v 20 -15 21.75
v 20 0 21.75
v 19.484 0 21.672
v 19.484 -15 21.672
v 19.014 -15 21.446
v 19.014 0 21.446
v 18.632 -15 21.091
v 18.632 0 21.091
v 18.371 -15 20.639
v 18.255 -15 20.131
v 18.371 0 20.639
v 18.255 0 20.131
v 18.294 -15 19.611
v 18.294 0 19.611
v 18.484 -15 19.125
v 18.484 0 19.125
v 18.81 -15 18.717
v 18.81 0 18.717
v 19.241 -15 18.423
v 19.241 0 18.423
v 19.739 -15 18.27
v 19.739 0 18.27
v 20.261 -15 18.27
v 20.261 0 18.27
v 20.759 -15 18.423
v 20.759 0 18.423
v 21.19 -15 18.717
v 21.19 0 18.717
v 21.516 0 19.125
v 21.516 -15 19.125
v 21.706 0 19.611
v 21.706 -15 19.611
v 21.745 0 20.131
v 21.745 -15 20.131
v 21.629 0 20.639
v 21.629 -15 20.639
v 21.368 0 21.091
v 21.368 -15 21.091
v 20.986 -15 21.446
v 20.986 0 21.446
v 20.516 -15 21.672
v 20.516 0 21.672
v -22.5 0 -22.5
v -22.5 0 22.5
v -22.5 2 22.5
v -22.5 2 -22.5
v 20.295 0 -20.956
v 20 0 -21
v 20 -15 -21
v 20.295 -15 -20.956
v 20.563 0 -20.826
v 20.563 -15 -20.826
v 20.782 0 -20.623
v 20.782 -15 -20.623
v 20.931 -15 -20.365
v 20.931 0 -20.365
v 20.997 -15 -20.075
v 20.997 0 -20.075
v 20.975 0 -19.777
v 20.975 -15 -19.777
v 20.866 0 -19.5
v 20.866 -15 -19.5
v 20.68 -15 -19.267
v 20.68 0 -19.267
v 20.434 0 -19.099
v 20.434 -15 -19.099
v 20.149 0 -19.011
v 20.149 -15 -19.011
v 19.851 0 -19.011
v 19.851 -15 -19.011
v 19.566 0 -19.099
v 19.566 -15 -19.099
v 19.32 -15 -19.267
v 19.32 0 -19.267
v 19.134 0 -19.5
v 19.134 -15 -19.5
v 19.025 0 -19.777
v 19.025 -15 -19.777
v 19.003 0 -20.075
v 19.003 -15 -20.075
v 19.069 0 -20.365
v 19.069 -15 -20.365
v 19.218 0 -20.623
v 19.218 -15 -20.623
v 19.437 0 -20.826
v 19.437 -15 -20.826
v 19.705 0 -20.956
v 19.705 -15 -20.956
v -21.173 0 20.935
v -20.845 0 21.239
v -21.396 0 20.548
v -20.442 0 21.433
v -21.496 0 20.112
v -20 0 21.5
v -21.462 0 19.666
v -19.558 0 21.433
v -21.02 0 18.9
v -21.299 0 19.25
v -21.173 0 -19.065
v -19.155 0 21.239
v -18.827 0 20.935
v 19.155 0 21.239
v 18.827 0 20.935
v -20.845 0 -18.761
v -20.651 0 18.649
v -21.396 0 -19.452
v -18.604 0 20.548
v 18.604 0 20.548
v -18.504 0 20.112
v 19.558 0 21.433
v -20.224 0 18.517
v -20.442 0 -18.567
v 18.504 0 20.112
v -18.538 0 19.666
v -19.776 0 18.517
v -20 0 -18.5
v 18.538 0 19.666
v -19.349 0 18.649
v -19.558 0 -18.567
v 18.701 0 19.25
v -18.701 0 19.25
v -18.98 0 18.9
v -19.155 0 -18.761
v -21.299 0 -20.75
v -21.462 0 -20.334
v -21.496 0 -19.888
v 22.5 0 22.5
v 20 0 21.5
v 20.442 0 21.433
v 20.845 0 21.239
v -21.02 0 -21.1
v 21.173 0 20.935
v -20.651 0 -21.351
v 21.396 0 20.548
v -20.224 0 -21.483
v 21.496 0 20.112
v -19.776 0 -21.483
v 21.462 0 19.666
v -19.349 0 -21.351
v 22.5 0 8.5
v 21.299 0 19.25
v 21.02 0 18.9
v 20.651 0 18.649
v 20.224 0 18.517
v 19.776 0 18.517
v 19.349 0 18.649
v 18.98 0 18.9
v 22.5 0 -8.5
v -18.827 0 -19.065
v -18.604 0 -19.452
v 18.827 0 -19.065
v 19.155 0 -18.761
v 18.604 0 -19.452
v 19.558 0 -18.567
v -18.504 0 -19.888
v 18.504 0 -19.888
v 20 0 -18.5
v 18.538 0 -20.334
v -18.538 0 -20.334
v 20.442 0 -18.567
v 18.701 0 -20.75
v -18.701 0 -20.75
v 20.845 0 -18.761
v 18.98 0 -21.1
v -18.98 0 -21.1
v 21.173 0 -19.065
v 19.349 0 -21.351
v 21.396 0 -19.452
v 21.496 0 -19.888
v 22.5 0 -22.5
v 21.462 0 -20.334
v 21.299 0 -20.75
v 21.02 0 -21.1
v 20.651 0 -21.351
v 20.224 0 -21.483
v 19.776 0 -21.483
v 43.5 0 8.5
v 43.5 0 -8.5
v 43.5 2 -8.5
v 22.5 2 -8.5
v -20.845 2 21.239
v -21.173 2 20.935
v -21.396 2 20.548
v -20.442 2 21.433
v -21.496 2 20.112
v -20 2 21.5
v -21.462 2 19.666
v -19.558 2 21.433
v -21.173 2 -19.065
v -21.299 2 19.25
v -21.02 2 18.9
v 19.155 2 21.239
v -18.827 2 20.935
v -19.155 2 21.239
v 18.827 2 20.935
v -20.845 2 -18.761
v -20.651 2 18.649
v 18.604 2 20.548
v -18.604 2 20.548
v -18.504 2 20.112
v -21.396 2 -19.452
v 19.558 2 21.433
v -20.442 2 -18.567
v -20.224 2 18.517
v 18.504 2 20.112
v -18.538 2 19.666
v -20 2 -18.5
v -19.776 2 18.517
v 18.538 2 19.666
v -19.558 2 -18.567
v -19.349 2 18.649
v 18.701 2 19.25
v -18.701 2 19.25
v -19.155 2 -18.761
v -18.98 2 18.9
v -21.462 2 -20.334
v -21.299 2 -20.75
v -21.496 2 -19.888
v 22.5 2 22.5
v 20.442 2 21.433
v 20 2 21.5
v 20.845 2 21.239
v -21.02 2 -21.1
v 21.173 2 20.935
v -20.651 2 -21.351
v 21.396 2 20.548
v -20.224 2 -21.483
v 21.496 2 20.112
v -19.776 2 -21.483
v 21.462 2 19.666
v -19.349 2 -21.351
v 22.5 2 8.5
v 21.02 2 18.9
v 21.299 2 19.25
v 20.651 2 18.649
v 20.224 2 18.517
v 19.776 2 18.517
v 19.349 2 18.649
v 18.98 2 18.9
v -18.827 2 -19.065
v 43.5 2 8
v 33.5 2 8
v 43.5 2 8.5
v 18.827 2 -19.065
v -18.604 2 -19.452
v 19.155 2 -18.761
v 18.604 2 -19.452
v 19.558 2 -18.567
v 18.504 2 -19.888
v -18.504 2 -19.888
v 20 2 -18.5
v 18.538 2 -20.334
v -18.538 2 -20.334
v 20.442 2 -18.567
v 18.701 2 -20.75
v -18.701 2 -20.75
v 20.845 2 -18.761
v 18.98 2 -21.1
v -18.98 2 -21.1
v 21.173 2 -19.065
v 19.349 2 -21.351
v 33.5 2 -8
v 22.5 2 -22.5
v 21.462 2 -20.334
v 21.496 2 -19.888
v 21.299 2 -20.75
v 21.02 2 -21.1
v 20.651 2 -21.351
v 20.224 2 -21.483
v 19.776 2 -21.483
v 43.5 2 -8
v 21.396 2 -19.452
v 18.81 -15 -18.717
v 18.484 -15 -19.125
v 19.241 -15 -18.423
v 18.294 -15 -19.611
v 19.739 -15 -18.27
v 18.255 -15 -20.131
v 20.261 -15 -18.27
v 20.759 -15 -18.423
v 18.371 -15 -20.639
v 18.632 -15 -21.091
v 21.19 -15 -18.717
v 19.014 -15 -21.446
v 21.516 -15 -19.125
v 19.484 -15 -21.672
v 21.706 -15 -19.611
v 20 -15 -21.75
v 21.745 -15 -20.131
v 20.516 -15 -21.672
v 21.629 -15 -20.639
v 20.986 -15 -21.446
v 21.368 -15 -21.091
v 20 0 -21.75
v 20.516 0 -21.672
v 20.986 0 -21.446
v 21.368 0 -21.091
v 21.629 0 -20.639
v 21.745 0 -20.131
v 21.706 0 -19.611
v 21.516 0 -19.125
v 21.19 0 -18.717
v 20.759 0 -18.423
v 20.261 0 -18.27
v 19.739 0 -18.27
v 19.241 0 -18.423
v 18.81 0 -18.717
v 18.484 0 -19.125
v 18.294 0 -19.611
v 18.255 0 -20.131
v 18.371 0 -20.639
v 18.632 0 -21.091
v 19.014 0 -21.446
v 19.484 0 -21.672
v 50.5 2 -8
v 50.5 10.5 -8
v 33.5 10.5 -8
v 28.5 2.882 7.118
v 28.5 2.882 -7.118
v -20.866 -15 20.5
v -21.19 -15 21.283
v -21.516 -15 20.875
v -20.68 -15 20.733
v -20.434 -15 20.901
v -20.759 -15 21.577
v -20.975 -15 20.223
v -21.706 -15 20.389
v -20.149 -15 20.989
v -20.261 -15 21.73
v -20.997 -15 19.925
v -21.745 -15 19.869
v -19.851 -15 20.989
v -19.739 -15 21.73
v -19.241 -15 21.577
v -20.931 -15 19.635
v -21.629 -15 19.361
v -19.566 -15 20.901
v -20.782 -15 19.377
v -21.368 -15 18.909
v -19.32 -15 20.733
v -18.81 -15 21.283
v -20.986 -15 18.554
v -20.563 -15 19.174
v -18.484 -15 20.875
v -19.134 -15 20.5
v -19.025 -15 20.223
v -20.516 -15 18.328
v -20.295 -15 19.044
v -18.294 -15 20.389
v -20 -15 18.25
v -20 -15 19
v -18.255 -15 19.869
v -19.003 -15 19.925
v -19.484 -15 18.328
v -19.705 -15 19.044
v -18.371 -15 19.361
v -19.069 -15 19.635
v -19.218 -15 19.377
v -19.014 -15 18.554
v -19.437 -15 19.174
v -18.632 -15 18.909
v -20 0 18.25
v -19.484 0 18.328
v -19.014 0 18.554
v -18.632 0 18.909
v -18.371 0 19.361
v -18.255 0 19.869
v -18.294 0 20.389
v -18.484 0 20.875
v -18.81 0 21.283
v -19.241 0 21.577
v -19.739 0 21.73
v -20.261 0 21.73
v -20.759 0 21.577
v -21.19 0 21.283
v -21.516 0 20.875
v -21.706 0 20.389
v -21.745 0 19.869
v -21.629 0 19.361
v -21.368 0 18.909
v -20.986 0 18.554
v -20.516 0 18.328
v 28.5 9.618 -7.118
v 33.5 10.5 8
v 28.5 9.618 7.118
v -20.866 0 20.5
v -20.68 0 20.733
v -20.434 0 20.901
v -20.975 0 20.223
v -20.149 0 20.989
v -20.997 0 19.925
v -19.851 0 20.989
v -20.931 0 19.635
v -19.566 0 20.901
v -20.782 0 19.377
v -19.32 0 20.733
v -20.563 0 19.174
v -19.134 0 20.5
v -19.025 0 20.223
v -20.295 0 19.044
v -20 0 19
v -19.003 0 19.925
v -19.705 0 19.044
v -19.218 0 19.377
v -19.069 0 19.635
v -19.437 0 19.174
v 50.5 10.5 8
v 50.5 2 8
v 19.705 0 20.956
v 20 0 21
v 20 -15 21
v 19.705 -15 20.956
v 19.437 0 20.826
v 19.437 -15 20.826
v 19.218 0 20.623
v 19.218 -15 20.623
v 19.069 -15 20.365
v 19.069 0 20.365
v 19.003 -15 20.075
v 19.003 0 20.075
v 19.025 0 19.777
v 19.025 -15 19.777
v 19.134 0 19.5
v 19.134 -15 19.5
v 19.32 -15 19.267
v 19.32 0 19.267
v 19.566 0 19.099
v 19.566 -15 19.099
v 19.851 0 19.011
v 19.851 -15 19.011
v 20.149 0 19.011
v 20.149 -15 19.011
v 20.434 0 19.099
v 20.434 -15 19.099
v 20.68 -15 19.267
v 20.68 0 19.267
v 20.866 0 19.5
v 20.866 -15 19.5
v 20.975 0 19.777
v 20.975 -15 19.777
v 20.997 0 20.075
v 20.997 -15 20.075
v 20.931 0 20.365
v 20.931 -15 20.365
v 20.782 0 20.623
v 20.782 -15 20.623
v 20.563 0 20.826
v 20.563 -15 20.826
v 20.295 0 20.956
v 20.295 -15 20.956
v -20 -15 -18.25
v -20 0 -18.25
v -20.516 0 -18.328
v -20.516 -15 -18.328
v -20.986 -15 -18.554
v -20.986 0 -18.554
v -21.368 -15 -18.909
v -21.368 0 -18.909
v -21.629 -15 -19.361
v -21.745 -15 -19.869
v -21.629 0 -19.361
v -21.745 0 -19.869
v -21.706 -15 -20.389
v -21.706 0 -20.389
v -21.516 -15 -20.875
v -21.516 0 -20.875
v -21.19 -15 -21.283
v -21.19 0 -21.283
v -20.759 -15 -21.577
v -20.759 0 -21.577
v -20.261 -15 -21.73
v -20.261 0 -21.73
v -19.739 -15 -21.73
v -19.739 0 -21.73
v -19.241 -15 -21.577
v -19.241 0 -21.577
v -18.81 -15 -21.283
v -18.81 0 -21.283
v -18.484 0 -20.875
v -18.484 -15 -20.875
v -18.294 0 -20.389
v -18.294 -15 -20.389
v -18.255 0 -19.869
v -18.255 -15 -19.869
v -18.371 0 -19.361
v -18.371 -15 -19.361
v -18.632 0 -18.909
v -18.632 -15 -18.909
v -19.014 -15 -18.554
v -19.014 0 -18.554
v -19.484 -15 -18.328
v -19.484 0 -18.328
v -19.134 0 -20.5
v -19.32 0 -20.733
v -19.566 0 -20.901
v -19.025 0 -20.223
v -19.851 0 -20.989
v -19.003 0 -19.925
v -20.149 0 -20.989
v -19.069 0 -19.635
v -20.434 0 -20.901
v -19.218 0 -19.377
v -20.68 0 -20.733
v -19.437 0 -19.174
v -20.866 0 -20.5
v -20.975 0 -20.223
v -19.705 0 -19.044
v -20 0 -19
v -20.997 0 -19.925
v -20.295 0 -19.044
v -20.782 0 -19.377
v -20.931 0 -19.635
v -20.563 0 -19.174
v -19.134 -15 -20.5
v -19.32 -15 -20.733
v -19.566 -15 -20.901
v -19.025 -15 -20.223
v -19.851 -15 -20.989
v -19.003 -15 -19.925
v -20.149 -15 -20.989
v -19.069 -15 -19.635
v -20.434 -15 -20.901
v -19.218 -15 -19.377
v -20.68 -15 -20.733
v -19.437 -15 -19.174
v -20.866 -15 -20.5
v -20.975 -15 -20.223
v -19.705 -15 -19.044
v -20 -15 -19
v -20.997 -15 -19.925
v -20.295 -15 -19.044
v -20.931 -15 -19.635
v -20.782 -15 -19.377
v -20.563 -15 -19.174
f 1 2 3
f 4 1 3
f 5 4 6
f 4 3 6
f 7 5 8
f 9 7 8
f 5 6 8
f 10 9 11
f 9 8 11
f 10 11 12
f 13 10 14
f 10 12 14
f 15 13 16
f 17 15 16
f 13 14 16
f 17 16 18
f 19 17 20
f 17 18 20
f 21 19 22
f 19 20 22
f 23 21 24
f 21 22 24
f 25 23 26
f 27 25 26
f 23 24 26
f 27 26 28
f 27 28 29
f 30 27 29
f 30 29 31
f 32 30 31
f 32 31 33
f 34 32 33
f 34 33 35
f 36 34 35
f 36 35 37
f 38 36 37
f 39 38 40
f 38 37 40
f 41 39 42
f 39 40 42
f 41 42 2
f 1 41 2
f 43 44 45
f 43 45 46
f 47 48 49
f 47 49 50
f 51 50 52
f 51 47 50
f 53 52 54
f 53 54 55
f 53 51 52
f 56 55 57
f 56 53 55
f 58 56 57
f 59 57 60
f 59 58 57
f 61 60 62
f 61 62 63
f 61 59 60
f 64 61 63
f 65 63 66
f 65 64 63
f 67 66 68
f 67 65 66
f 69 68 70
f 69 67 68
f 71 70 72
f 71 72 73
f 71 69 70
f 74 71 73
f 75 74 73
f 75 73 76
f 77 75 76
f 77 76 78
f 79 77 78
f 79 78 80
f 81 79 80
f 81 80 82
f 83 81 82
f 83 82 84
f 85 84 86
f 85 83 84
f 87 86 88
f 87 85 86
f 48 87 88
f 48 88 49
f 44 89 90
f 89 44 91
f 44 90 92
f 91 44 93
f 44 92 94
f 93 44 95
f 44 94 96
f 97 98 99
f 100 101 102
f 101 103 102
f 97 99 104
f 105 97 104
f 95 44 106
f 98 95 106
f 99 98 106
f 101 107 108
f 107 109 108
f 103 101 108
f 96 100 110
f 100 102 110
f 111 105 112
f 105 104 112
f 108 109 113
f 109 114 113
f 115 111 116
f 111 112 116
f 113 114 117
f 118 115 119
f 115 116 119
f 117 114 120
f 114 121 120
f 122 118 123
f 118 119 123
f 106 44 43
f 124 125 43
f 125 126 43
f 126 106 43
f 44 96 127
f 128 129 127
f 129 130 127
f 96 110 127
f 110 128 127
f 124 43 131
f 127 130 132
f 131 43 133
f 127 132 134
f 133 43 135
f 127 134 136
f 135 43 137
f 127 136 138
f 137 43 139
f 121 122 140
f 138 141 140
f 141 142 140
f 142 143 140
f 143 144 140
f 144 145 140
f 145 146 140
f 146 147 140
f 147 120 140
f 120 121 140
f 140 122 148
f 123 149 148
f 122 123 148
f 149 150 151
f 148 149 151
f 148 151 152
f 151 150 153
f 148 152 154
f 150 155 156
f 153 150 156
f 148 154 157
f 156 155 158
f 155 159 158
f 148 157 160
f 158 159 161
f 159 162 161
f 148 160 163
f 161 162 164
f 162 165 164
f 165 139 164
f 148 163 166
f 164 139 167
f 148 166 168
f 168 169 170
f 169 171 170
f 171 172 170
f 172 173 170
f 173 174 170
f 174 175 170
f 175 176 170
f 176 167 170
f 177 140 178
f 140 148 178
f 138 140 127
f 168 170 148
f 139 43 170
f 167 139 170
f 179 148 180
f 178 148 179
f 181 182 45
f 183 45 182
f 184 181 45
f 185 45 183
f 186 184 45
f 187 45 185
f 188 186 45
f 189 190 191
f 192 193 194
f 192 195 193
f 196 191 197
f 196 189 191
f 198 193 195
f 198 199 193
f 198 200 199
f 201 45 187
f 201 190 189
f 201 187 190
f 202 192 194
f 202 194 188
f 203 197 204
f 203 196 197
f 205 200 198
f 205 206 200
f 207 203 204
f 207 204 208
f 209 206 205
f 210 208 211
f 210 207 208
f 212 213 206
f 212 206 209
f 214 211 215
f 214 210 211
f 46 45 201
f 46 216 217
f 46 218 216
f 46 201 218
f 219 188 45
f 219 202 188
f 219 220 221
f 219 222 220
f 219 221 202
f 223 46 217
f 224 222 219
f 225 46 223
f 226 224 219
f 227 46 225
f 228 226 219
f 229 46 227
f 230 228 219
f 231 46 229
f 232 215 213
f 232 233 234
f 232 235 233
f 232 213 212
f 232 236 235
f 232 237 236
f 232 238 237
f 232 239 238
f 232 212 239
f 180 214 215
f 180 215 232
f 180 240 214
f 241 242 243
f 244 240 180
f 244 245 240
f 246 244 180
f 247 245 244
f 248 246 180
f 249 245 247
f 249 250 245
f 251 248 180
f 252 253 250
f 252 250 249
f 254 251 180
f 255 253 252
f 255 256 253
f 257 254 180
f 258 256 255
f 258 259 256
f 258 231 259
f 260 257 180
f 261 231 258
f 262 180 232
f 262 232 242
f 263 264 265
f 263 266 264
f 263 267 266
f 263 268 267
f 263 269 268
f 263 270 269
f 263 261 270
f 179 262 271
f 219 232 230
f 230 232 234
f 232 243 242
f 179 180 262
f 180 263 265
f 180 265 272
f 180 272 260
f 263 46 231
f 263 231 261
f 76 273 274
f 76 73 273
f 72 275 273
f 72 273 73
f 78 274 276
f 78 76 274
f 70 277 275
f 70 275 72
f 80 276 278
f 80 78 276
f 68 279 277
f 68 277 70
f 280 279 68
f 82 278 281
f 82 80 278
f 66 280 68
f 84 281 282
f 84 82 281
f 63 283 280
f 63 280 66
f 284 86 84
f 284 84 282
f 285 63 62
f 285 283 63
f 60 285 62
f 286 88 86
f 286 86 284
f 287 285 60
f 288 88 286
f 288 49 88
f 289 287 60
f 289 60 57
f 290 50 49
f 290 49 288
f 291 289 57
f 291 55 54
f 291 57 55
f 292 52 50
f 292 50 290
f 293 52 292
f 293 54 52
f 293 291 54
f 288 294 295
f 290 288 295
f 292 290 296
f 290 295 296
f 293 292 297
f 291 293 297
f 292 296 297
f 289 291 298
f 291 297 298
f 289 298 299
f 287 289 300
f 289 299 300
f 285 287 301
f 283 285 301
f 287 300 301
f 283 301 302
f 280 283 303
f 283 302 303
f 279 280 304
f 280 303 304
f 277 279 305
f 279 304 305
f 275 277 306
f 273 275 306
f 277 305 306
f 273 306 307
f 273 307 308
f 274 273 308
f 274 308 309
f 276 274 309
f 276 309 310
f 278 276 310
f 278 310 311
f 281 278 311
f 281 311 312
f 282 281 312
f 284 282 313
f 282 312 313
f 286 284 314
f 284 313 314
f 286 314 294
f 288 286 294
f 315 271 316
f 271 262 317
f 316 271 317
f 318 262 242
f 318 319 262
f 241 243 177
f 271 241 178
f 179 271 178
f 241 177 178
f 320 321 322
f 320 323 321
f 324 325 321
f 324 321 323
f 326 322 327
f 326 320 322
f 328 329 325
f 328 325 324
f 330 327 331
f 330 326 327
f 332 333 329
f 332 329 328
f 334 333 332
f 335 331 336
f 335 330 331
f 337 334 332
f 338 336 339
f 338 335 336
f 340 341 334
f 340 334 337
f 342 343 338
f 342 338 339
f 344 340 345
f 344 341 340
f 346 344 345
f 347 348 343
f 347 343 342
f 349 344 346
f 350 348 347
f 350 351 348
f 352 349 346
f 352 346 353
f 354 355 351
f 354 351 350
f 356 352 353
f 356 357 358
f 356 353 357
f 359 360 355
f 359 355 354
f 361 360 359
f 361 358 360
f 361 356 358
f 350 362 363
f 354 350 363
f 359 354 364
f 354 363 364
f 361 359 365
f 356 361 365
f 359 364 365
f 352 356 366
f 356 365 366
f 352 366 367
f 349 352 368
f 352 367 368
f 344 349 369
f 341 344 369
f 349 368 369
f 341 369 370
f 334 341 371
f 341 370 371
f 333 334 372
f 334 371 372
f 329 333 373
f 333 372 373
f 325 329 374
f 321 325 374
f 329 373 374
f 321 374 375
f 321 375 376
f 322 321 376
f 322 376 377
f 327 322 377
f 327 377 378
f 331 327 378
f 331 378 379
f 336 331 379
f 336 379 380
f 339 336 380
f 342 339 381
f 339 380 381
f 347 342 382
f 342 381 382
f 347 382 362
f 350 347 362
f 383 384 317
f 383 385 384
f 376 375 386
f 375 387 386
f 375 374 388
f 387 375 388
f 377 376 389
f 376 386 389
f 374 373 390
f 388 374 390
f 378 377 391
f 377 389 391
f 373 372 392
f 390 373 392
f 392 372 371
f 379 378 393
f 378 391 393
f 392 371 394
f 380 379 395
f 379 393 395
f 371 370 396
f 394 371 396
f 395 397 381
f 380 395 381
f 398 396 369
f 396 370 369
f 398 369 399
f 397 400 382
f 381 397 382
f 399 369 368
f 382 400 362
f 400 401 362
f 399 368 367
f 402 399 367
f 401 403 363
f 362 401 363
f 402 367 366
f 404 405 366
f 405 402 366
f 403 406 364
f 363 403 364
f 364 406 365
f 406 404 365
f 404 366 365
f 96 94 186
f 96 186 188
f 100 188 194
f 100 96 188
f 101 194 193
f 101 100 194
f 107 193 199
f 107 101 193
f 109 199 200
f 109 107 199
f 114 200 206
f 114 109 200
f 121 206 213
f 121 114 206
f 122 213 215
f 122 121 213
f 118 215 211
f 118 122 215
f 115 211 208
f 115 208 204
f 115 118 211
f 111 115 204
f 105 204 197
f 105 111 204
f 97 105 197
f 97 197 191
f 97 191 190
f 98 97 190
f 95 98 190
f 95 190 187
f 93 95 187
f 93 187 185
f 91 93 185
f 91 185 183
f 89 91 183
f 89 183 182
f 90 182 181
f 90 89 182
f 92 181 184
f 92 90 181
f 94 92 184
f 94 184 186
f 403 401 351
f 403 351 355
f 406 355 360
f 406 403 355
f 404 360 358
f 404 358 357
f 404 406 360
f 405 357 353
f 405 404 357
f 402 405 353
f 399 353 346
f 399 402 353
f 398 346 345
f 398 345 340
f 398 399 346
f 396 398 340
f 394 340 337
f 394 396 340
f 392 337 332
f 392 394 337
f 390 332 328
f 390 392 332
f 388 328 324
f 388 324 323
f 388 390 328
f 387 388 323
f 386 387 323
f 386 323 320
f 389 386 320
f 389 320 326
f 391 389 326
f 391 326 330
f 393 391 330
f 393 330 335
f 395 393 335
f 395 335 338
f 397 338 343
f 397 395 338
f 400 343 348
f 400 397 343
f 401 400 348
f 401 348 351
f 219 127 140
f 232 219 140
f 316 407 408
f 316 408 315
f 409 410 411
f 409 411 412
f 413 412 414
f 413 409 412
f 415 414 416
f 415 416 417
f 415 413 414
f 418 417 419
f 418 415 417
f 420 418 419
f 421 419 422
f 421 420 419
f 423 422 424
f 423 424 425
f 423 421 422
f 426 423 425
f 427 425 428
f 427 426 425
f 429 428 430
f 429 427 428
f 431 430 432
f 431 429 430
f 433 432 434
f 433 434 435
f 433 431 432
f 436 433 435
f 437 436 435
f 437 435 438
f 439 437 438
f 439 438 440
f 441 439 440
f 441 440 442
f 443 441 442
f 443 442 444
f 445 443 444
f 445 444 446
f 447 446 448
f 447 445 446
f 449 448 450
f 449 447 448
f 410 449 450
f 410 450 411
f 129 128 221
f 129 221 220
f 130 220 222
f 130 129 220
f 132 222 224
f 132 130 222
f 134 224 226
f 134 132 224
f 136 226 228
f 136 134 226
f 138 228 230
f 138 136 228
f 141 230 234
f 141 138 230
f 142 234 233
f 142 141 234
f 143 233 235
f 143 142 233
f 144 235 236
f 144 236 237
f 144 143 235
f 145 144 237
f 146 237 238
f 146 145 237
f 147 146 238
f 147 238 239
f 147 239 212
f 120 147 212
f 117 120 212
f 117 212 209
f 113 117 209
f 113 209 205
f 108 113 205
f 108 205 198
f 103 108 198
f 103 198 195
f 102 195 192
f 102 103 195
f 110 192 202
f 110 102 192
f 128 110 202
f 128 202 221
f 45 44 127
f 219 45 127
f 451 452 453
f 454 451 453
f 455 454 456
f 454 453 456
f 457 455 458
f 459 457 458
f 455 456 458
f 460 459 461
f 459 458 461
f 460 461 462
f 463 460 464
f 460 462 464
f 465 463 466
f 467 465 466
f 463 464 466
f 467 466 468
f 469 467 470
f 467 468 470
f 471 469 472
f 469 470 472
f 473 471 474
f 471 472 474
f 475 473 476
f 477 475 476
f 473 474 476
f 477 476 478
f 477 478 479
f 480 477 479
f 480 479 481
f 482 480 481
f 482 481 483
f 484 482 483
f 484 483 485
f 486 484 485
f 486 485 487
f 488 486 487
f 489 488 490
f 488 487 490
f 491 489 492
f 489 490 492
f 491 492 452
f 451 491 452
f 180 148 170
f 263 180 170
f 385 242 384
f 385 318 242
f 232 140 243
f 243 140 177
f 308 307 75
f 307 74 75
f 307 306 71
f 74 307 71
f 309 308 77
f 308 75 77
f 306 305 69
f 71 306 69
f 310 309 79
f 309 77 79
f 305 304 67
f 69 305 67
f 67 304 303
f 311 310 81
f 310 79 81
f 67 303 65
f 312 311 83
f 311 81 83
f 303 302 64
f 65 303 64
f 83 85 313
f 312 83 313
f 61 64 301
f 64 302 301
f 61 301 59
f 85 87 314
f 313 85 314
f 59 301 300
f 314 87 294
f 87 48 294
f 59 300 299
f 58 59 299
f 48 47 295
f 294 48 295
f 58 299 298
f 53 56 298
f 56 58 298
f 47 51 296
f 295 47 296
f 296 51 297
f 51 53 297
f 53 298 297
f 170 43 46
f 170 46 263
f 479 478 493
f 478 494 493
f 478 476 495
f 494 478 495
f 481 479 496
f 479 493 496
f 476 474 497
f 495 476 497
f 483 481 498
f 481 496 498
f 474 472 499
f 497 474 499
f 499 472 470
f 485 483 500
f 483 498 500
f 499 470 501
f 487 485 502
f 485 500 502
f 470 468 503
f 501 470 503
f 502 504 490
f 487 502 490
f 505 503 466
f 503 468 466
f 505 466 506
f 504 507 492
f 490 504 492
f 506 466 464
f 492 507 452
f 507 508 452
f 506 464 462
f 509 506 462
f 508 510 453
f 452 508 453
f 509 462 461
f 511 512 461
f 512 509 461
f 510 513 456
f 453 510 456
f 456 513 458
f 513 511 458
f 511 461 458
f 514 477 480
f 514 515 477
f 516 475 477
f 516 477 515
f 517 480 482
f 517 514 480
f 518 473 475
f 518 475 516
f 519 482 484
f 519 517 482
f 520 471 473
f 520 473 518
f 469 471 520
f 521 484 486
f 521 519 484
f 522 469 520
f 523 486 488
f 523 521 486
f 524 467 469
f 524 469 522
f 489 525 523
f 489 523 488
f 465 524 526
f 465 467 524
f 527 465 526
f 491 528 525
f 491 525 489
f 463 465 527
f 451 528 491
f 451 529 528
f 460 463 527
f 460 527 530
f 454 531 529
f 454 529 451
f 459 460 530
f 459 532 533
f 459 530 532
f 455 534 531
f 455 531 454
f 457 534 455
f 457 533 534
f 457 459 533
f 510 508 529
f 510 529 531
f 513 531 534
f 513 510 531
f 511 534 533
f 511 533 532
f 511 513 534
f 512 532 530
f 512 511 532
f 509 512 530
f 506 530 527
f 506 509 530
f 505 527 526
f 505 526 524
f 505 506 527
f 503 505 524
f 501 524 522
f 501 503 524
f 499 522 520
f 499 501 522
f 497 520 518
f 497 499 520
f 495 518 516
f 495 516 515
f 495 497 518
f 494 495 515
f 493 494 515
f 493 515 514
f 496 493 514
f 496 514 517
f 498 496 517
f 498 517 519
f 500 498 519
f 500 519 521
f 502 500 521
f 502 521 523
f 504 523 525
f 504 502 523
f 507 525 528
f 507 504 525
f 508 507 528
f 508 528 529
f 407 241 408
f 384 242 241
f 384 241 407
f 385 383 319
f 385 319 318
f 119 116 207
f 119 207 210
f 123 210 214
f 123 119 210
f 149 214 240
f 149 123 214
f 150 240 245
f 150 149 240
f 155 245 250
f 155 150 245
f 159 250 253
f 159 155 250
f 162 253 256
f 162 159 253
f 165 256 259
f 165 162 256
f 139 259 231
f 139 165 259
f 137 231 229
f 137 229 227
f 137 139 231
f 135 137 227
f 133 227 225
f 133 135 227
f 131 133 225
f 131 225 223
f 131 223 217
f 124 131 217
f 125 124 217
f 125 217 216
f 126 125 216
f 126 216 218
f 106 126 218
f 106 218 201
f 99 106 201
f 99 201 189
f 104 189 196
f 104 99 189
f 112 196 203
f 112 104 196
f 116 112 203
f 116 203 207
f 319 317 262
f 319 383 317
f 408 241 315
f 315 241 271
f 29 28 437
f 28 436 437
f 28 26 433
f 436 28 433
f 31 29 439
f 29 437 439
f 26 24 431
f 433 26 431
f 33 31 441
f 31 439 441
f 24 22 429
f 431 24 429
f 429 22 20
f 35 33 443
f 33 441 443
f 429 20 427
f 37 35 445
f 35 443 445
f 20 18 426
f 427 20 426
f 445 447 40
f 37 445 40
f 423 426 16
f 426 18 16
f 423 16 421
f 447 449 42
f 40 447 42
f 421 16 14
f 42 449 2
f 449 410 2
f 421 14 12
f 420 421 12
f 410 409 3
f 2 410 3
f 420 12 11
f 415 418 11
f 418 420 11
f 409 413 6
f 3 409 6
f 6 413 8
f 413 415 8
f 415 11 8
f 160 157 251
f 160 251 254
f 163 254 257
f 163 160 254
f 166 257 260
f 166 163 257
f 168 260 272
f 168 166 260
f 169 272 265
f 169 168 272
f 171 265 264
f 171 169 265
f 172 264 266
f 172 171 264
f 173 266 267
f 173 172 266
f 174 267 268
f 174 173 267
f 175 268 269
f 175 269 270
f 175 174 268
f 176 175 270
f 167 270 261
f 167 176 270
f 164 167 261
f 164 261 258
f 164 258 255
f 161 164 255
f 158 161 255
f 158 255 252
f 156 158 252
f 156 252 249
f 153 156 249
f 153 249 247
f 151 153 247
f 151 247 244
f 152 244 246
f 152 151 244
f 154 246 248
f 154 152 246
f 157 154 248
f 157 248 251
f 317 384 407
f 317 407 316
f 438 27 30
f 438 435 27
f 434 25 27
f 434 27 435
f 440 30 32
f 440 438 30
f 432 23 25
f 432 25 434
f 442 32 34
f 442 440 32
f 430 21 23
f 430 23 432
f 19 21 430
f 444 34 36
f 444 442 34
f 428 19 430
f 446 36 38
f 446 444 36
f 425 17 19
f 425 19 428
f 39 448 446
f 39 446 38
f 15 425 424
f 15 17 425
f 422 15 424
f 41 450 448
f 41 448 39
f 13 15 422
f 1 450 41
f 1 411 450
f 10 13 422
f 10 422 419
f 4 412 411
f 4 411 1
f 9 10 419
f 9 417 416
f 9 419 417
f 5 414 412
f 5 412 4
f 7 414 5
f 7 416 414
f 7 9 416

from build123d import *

# Parameters (mm, degrees)
SKETCH_1_W           = 45
SKETCH_1_H           = 45
SKETCH_1_R           = 1.5
SKETCH_1_W_2         = 21
SKETCH_1_H_2         = 17
EXTRUDE_1_DEPTH      = 2
SKETCH_2_R           = 1.75
SKETCH_2_R_2         = 1
EXTRUDE_2_DEPTH      = 15
EXTRUDE_2_2_DEPTH    = 15
EXTRUDE_2_3_DEPTH    = 15
EXTRUDE_2_4_DEPTH    = 15
EXTRUDE_3_DEPTH      = 7
EXTRUDE_3_DEPTH_BACK = 10
SKETCH_5_W           = 16
SKETCH_5_H           = 8.5
SKETCH_6_W           = 16
SKETCH_6_H           = 8.5
EXTRUDE_4_DEPTH      = 5
EXTRUDE_4_TAPER      = 10


with BuildPart() as part:
    # 草图1 → 凸台-拉伸1 (new body)
    # profile 1 of 2: a face of its own
    with BuildSketch(Plane(origin=(0, 0, 0), x_dir=(1, 0, 0), z_dir=(0, 1, 0))):
        Rectangle(SKETCH_1_W, SKETCH_1_H)
        with Locations(Location((20, -20, 0), (0, 0, 270))):
            Circle(SKETCH_1_R, mode=Mode.SUBTRACT)
        with Locations(Location((20, 20, 0), (0, 0, 270))):
            Circle(SKETCH_1_R, mode=Mode.SUBTRACT)
        with Locations(Location((-20, 20, 0), (0, 0, 270))):
            Circle(SKETCH_1_R, mode=Mode.SUBTRACT)
        with Locations(Location((-20, -20, 0), (0, 0, 270))):
            Circle(SKETCH_1_R, mode=Mode.SUBTRACT)
    # profile 2 of 2: a face of its own
    with BuildSketch(Plane(origin=(0, 0, 0), x_dir=(1, 0, 0), z_dir=(0, 1, 0))):
        with Locations((33, 0)):
            Rectangle(SKETCH_1_W_2, SKETCH_1_H_2)
    extrude(amount=EXTRUDE_1_DEPTH)



with BuildPart() as body_2:
    # 草图2 → 凸台-拉伸2 (new body)
    with BuildSketch(Plane.XZ):
        with Locations(Location((-20, 20, 0), (0, 0, 270))):
            Circle(SKETCH_2_R)
        with Locations(Location((-20, 20, 0), (0, 0, 270))):
            Circle(SKETCH_2_R_2, mode=Mode.SUBTRACT)
    extrude(amount=EXTRUDE_2_DEPTH)


with BuildPart() as body_3:
    # 草图2 → Extrude 2 2 (new body)
    with BuildSketch(Plane.XZ):
        with Locations(Location((20, 20, 0), (0, 0, 90))):
            Circle(SKETCH_2_R)
        with Locations(Location((20, 20, 0), (0, 0, 90))):
            Circle(SKETCH_2_R_2, mode=Mode.SUBTRACT)
    extrude(amount=EXTRUDE_2_2_DEPTH)


with BuildPart() as body_4:
    # 草图2 → Extrude 2 3 (new body)
    with BuildSketch(Plane.XZ):
        with Locations(Location((20, -20, 0), (0, 0, 270))):
            Circle(SKETCH_2_R)
        with Locations(Location((20, -20, 0), (0, 0, 270))):
            Circle(SKETCH_2_R_2, mode=Mode.SUBTRACT)
    extrude(amount=EXTRUDE_2_3_DEPTH)


with BuildPart() as body_5:
    # 草图2 → Extrude 2 4 (new body)
    with BuildSketch(Plane.XZ):
        with Locations(Location((-20, -20, 0), (0, 0, 90))):
            Circle(SKETCH_2_R)
        with Locations(Location((-20, -20, 0), (0, 0, 90))):
            Circle(SKETCH_2_R_2, mode=Mode.SUBTRACT)
    extrude(amount=EXTRUDE_2_4_DEPTH)


with BuildPart() as body_6:
    # 草图5 → 凸台-拉伸3 (new, two sides: drawn at the far end of the back side and taken through both)
    with BuildSketch(Plane(origin=(43.5, 0, 0), x_dir=(0, 0, -1), z_dir=(1, 0, 0)).offset(-EXTRUDE_3_DEPTH_BACK)):
        with Locations((0, 6.25)):
            Rectangle(SKETCH_5_W, SKETCH_5_H)
    extrude(amount=EXTRUDE_3_DEPTH + EXTRUDE_3_DEPTH_BACK)


with BuildPart() as part_1:
    add(part.part)

    add(body_6.part)  # 凸台-拉伸4 merges body 6
    # 草图6 → 凸台-拉伸4 (add)
    with BuildSketch(Plane.ZY.offset(-33.5)):
        with Locations((0, 6.25)):
            Rectangle(SKETCH_6_W, SKETCH_6_H)
    extrude(amount=EXTRUDE_4_DEPTH, taper=EXTRUDE_4_TAPER)


solid = Compound([body_2.part, body_3.part, body_4.part, body_5.part, part_1.part])
